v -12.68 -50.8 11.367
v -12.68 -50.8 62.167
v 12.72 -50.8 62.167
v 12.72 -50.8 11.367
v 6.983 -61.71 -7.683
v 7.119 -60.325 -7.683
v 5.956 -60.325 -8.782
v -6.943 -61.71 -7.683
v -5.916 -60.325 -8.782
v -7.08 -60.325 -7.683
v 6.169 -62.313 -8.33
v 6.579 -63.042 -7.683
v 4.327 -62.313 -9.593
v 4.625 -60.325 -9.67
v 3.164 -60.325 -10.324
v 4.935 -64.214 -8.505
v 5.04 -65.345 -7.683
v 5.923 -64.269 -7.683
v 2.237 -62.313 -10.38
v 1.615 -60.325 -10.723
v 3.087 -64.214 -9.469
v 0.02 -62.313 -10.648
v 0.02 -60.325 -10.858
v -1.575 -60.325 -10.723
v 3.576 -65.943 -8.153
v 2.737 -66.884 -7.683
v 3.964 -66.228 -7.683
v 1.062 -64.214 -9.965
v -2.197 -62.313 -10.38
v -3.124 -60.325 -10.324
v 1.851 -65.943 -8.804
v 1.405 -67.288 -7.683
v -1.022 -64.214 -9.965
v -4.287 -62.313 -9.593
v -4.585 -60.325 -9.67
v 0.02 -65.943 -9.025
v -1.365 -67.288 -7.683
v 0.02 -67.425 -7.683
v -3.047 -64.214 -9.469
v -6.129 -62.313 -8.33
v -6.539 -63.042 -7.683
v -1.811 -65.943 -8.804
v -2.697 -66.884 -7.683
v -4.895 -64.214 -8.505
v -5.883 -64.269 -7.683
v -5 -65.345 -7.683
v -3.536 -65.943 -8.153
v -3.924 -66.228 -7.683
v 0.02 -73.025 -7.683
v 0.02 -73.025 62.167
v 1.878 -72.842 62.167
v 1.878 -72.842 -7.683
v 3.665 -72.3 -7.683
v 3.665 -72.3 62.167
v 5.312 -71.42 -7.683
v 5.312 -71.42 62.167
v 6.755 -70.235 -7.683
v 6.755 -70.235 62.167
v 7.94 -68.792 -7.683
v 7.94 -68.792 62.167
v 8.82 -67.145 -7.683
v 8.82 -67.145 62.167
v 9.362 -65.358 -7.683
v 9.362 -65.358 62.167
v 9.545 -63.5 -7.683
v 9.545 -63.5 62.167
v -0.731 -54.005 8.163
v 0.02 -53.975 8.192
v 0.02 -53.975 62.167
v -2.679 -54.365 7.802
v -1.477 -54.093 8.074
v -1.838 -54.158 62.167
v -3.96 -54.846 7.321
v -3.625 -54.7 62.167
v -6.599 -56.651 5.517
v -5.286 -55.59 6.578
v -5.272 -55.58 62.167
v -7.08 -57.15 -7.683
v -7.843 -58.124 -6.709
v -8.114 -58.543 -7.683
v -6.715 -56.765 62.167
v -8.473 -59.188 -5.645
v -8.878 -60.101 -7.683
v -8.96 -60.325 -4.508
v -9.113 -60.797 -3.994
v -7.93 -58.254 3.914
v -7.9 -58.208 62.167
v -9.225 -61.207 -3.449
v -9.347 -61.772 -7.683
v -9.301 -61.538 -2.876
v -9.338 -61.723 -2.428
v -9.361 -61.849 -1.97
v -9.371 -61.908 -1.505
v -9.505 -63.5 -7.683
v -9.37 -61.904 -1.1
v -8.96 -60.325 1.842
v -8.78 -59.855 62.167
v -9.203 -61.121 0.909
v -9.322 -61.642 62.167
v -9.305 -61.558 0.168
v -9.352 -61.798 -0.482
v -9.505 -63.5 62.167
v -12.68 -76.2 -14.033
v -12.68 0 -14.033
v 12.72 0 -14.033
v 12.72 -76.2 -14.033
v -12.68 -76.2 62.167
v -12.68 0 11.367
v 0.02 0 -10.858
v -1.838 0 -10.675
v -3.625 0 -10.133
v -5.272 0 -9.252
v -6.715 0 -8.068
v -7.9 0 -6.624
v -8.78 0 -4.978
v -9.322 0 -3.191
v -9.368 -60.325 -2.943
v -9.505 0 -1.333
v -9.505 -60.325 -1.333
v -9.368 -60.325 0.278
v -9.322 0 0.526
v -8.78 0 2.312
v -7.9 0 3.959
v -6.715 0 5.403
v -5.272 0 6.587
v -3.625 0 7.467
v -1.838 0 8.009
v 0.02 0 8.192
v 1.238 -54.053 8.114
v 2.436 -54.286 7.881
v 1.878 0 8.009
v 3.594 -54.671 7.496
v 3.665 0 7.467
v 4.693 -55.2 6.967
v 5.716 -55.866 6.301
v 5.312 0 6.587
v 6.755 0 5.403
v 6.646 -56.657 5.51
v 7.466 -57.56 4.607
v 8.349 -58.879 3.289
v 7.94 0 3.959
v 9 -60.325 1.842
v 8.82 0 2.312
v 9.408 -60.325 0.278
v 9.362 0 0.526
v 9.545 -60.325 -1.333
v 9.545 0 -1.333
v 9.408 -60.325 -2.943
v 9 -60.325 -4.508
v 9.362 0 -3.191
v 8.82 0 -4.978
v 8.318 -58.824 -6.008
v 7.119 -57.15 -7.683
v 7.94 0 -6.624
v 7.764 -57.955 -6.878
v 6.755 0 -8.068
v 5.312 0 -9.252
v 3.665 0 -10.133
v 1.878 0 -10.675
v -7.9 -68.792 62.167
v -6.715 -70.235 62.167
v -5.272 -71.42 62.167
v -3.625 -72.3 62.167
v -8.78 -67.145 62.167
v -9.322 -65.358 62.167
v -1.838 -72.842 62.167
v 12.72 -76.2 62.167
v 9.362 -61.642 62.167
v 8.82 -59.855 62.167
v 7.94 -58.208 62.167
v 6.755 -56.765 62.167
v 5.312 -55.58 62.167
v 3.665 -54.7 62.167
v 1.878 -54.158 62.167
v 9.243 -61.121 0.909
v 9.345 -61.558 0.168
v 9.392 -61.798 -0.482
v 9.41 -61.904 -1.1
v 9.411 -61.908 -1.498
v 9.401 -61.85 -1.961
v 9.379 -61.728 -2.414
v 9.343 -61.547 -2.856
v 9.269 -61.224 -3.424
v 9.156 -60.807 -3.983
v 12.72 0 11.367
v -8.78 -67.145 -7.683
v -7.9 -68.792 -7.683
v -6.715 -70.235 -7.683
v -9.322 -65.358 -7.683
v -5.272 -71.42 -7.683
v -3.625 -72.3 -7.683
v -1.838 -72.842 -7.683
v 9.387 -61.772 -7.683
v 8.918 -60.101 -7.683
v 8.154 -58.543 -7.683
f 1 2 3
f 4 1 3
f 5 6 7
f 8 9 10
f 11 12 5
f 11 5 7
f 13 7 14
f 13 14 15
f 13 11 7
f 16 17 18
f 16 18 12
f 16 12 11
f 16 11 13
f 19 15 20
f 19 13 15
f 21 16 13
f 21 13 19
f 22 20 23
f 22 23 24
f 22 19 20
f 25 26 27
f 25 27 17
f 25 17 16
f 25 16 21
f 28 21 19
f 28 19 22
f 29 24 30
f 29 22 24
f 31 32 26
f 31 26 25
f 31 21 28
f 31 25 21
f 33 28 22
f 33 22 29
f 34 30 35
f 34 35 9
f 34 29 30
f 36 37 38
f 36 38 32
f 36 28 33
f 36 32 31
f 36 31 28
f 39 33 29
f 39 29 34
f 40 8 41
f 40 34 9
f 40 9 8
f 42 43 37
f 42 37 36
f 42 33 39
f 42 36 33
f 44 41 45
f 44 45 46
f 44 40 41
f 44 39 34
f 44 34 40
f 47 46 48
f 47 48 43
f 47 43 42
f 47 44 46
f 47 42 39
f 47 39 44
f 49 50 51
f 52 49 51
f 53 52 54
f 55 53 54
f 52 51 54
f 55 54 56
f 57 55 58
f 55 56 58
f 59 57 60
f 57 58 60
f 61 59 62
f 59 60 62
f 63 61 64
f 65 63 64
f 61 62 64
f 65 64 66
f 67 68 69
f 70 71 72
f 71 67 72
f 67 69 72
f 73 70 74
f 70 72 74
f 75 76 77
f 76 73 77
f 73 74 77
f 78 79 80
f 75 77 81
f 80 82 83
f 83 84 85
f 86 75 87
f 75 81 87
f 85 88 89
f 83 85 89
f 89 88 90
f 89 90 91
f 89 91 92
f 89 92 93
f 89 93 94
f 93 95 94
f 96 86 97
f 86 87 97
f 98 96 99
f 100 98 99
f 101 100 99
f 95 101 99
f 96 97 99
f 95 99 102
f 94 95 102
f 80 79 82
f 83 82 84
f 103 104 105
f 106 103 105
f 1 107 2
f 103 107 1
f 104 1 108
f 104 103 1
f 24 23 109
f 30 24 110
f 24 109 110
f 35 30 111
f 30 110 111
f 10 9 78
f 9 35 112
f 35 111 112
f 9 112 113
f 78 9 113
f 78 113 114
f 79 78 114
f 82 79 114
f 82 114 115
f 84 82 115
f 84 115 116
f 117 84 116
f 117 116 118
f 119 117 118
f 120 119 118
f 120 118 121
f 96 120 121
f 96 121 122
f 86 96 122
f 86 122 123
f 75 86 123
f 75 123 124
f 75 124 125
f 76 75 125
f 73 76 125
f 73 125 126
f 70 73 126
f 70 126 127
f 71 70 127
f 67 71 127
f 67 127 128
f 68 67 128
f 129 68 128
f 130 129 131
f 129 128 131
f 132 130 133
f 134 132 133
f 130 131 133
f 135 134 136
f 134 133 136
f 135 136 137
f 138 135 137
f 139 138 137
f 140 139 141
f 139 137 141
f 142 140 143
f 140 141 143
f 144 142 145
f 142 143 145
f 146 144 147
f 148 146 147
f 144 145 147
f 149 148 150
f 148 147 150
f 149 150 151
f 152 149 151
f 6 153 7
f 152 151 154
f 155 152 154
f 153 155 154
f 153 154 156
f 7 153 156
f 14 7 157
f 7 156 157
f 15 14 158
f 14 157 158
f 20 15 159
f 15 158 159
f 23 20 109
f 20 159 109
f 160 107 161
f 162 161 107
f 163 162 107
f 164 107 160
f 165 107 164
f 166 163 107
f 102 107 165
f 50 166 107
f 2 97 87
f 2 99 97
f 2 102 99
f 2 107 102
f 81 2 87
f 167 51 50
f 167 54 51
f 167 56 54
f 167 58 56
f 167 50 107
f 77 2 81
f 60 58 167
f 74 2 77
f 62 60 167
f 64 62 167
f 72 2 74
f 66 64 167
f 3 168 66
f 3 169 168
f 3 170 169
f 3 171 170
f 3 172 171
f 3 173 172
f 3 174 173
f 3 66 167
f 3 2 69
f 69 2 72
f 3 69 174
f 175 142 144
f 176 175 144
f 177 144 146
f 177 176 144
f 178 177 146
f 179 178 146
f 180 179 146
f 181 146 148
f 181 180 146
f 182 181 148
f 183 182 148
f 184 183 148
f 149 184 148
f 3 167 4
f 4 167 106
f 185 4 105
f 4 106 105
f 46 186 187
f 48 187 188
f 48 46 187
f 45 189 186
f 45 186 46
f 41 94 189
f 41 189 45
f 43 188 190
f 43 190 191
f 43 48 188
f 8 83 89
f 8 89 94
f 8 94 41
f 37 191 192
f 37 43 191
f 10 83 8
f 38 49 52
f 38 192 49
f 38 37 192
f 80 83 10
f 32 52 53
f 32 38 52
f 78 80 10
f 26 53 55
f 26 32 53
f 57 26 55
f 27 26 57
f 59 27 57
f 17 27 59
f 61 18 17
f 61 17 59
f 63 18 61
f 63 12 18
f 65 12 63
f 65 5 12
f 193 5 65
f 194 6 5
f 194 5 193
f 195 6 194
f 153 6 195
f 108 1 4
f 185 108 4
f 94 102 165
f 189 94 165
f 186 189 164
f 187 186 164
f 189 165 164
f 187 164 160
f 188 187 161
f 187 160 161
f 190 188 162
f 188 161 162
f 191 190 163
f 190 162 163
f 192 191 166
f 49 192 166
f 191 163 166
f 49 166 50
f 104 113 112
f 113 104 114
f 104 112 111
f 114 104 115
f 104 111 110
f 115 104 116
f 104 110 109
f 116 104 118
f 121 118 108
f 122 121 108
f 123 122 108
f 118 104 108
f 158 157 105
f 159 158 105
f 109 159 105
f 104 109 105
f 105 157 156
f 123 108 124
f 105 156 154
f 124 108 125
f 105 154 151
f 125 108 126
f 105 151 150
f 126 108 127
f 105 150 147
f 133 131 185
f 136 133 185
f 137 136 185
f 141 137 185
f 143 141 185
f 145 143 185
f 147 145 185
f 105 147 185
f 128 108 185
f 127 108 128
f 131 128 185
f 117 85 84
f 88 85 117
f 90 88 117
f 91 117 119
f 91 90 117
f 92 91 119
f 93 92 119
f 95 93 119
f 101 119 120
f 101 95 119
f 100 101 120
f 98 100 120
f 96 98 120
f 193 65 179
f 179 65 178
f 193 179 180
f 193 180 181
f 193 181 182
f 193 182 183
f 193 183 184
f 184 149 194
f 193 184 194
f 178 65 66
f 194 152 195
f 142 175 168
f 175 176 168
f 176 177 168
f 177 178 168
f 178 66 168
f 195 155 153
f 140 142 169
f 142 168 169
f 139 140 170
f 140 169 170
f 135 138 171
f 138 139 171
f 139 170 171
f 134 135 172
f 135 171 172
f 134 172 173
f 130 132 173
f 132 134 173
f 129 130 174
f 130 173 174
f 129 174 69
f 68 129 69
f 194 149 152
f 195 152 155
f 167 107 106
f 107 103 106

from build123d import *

# Parameters (mm, degrees)
F0_W     = 25.4
F0_H     = 25.4
F1_DEPTH = 76.2
F2_W     = 25.4
F2_H     = 25.4
F3_DEPTH = 50.8
F5_DEPTH = 69.85
F7_R     = 9.525
F8_DEPTH = 69.85


with BuildPart() as f1:
    # F0 (on Front) → F1 (new body)
    with BuildSketch(Plane.XZ):
        with Locations((0.0199213878, -1.3326740591)):
            Rectangle(F0_W, F0_H)
    extrude(amount=F1_DEPTH)

    # F2 (on face) → F3 (join)
    with BuildSketch(Plane.XY.offset(11.3673259409)):
        with Locations((0.0199213878, -63.5)):
            Rectangle(F2_W, F2_H)
    extrude(amount=F3_DEPTH)

    # F4 (on face) → F5 (cut)
    with BuildSketch(Plane(origin=(0, 0, 0), x_dir=(-1, 0, 0), z_dir=(0, 1, 0))):
        with BuildLine():
            ThreePointArc((-0.0199213878, -10.8576740591), (6.715270703, -8.0678661499), (9.5050786122, -1.3326740591))
            Line((9.5050786122, -1.3326740591), (-0.0199213878, -1.3326740591))
            Line((-0.0199213878, -1.3326740591), (-0.0199213878, -10.8576740591))
        make_face()
        with BuildLine():
            Line((-0.0199213878, -10.8576740591), (-0.0199213878, -1.3326740591))
            Line((-0.0199213878, -1.3326740591), (-9.5449213878, -1.3326740591))
            ThreePointArc((-9.5449213878, -1.3326740591), (-6.7551134786, -8.0678661499), (-0.0199213878, -10.8576740591))
        make_face()
        with BuildLine():
            Line((-0.0199213878, -1.3326740591), (9.5050786122, -1.3326740591))
            ThreePointArc((9.5050786122, -1.3326740591), (-0.0199213878, 8.1923259409), (-9.5449213878, -1.3326740591))
            Line((-9.5449213878, -1.3326740591), (-0.0199213878, -1.3326740591))
        make_face()
    extrude(amount=-F5_DEPTH, mode=Mode.SUBTRACT)

    # F7
    f7_edges = [f1.edges().sort_by_distance(p)[0] for p in [
        (9.544921, -69.85, -1.332674),
    ]]
    fillet(f7_edges, radius=F7_R)

    # F6 (on face) → F8 (cut)
    with BuildSketch(Plane.XY.offset(62.1673259409)):
        with BuildLine():
            ThreePointArc((9.5449213878, -63.5), (6.7551134786, -56.7648079092), (0.0199213878, -53.975))
            Line((0.0199213878, -53.975), (0.0199213878, -63.5))
            Line((0.0199213878, -63.5), (0.0199213878, -73.025))
            ThreePointArc((0.0199213878, -73.025), (6.7551134786, -70.2351920908), (9.5449213878, -63.5))
        make_face()
        with BuildLine():
            Line((0.0199213878, -73.025), (0.0199213878, -63.5))
            Line((0.0199213878, -63.5), (-9.5050786122, -63.5))
            ThreePointArc((-9.5050786122, -63.5), (-6.715270703, -70.2351920908), (0.0199213878, -73.025))
        make_face()
        with BuildLine():
            Line((0.0199213878, -63.5), (0.0199213878, -53.975))
            ThreePointArc((0.0199213878, -53.975), (-6.715270703, -56.7648079092), (-9.5050786122, -63.5))
            Line((-9.5050786122, -63.5), (0.0199213878, -63.5))
        make_face()
    extrude(amount=-F8_DEPTH, mode=Mode.SUBTRACT)


solid = f1.part
